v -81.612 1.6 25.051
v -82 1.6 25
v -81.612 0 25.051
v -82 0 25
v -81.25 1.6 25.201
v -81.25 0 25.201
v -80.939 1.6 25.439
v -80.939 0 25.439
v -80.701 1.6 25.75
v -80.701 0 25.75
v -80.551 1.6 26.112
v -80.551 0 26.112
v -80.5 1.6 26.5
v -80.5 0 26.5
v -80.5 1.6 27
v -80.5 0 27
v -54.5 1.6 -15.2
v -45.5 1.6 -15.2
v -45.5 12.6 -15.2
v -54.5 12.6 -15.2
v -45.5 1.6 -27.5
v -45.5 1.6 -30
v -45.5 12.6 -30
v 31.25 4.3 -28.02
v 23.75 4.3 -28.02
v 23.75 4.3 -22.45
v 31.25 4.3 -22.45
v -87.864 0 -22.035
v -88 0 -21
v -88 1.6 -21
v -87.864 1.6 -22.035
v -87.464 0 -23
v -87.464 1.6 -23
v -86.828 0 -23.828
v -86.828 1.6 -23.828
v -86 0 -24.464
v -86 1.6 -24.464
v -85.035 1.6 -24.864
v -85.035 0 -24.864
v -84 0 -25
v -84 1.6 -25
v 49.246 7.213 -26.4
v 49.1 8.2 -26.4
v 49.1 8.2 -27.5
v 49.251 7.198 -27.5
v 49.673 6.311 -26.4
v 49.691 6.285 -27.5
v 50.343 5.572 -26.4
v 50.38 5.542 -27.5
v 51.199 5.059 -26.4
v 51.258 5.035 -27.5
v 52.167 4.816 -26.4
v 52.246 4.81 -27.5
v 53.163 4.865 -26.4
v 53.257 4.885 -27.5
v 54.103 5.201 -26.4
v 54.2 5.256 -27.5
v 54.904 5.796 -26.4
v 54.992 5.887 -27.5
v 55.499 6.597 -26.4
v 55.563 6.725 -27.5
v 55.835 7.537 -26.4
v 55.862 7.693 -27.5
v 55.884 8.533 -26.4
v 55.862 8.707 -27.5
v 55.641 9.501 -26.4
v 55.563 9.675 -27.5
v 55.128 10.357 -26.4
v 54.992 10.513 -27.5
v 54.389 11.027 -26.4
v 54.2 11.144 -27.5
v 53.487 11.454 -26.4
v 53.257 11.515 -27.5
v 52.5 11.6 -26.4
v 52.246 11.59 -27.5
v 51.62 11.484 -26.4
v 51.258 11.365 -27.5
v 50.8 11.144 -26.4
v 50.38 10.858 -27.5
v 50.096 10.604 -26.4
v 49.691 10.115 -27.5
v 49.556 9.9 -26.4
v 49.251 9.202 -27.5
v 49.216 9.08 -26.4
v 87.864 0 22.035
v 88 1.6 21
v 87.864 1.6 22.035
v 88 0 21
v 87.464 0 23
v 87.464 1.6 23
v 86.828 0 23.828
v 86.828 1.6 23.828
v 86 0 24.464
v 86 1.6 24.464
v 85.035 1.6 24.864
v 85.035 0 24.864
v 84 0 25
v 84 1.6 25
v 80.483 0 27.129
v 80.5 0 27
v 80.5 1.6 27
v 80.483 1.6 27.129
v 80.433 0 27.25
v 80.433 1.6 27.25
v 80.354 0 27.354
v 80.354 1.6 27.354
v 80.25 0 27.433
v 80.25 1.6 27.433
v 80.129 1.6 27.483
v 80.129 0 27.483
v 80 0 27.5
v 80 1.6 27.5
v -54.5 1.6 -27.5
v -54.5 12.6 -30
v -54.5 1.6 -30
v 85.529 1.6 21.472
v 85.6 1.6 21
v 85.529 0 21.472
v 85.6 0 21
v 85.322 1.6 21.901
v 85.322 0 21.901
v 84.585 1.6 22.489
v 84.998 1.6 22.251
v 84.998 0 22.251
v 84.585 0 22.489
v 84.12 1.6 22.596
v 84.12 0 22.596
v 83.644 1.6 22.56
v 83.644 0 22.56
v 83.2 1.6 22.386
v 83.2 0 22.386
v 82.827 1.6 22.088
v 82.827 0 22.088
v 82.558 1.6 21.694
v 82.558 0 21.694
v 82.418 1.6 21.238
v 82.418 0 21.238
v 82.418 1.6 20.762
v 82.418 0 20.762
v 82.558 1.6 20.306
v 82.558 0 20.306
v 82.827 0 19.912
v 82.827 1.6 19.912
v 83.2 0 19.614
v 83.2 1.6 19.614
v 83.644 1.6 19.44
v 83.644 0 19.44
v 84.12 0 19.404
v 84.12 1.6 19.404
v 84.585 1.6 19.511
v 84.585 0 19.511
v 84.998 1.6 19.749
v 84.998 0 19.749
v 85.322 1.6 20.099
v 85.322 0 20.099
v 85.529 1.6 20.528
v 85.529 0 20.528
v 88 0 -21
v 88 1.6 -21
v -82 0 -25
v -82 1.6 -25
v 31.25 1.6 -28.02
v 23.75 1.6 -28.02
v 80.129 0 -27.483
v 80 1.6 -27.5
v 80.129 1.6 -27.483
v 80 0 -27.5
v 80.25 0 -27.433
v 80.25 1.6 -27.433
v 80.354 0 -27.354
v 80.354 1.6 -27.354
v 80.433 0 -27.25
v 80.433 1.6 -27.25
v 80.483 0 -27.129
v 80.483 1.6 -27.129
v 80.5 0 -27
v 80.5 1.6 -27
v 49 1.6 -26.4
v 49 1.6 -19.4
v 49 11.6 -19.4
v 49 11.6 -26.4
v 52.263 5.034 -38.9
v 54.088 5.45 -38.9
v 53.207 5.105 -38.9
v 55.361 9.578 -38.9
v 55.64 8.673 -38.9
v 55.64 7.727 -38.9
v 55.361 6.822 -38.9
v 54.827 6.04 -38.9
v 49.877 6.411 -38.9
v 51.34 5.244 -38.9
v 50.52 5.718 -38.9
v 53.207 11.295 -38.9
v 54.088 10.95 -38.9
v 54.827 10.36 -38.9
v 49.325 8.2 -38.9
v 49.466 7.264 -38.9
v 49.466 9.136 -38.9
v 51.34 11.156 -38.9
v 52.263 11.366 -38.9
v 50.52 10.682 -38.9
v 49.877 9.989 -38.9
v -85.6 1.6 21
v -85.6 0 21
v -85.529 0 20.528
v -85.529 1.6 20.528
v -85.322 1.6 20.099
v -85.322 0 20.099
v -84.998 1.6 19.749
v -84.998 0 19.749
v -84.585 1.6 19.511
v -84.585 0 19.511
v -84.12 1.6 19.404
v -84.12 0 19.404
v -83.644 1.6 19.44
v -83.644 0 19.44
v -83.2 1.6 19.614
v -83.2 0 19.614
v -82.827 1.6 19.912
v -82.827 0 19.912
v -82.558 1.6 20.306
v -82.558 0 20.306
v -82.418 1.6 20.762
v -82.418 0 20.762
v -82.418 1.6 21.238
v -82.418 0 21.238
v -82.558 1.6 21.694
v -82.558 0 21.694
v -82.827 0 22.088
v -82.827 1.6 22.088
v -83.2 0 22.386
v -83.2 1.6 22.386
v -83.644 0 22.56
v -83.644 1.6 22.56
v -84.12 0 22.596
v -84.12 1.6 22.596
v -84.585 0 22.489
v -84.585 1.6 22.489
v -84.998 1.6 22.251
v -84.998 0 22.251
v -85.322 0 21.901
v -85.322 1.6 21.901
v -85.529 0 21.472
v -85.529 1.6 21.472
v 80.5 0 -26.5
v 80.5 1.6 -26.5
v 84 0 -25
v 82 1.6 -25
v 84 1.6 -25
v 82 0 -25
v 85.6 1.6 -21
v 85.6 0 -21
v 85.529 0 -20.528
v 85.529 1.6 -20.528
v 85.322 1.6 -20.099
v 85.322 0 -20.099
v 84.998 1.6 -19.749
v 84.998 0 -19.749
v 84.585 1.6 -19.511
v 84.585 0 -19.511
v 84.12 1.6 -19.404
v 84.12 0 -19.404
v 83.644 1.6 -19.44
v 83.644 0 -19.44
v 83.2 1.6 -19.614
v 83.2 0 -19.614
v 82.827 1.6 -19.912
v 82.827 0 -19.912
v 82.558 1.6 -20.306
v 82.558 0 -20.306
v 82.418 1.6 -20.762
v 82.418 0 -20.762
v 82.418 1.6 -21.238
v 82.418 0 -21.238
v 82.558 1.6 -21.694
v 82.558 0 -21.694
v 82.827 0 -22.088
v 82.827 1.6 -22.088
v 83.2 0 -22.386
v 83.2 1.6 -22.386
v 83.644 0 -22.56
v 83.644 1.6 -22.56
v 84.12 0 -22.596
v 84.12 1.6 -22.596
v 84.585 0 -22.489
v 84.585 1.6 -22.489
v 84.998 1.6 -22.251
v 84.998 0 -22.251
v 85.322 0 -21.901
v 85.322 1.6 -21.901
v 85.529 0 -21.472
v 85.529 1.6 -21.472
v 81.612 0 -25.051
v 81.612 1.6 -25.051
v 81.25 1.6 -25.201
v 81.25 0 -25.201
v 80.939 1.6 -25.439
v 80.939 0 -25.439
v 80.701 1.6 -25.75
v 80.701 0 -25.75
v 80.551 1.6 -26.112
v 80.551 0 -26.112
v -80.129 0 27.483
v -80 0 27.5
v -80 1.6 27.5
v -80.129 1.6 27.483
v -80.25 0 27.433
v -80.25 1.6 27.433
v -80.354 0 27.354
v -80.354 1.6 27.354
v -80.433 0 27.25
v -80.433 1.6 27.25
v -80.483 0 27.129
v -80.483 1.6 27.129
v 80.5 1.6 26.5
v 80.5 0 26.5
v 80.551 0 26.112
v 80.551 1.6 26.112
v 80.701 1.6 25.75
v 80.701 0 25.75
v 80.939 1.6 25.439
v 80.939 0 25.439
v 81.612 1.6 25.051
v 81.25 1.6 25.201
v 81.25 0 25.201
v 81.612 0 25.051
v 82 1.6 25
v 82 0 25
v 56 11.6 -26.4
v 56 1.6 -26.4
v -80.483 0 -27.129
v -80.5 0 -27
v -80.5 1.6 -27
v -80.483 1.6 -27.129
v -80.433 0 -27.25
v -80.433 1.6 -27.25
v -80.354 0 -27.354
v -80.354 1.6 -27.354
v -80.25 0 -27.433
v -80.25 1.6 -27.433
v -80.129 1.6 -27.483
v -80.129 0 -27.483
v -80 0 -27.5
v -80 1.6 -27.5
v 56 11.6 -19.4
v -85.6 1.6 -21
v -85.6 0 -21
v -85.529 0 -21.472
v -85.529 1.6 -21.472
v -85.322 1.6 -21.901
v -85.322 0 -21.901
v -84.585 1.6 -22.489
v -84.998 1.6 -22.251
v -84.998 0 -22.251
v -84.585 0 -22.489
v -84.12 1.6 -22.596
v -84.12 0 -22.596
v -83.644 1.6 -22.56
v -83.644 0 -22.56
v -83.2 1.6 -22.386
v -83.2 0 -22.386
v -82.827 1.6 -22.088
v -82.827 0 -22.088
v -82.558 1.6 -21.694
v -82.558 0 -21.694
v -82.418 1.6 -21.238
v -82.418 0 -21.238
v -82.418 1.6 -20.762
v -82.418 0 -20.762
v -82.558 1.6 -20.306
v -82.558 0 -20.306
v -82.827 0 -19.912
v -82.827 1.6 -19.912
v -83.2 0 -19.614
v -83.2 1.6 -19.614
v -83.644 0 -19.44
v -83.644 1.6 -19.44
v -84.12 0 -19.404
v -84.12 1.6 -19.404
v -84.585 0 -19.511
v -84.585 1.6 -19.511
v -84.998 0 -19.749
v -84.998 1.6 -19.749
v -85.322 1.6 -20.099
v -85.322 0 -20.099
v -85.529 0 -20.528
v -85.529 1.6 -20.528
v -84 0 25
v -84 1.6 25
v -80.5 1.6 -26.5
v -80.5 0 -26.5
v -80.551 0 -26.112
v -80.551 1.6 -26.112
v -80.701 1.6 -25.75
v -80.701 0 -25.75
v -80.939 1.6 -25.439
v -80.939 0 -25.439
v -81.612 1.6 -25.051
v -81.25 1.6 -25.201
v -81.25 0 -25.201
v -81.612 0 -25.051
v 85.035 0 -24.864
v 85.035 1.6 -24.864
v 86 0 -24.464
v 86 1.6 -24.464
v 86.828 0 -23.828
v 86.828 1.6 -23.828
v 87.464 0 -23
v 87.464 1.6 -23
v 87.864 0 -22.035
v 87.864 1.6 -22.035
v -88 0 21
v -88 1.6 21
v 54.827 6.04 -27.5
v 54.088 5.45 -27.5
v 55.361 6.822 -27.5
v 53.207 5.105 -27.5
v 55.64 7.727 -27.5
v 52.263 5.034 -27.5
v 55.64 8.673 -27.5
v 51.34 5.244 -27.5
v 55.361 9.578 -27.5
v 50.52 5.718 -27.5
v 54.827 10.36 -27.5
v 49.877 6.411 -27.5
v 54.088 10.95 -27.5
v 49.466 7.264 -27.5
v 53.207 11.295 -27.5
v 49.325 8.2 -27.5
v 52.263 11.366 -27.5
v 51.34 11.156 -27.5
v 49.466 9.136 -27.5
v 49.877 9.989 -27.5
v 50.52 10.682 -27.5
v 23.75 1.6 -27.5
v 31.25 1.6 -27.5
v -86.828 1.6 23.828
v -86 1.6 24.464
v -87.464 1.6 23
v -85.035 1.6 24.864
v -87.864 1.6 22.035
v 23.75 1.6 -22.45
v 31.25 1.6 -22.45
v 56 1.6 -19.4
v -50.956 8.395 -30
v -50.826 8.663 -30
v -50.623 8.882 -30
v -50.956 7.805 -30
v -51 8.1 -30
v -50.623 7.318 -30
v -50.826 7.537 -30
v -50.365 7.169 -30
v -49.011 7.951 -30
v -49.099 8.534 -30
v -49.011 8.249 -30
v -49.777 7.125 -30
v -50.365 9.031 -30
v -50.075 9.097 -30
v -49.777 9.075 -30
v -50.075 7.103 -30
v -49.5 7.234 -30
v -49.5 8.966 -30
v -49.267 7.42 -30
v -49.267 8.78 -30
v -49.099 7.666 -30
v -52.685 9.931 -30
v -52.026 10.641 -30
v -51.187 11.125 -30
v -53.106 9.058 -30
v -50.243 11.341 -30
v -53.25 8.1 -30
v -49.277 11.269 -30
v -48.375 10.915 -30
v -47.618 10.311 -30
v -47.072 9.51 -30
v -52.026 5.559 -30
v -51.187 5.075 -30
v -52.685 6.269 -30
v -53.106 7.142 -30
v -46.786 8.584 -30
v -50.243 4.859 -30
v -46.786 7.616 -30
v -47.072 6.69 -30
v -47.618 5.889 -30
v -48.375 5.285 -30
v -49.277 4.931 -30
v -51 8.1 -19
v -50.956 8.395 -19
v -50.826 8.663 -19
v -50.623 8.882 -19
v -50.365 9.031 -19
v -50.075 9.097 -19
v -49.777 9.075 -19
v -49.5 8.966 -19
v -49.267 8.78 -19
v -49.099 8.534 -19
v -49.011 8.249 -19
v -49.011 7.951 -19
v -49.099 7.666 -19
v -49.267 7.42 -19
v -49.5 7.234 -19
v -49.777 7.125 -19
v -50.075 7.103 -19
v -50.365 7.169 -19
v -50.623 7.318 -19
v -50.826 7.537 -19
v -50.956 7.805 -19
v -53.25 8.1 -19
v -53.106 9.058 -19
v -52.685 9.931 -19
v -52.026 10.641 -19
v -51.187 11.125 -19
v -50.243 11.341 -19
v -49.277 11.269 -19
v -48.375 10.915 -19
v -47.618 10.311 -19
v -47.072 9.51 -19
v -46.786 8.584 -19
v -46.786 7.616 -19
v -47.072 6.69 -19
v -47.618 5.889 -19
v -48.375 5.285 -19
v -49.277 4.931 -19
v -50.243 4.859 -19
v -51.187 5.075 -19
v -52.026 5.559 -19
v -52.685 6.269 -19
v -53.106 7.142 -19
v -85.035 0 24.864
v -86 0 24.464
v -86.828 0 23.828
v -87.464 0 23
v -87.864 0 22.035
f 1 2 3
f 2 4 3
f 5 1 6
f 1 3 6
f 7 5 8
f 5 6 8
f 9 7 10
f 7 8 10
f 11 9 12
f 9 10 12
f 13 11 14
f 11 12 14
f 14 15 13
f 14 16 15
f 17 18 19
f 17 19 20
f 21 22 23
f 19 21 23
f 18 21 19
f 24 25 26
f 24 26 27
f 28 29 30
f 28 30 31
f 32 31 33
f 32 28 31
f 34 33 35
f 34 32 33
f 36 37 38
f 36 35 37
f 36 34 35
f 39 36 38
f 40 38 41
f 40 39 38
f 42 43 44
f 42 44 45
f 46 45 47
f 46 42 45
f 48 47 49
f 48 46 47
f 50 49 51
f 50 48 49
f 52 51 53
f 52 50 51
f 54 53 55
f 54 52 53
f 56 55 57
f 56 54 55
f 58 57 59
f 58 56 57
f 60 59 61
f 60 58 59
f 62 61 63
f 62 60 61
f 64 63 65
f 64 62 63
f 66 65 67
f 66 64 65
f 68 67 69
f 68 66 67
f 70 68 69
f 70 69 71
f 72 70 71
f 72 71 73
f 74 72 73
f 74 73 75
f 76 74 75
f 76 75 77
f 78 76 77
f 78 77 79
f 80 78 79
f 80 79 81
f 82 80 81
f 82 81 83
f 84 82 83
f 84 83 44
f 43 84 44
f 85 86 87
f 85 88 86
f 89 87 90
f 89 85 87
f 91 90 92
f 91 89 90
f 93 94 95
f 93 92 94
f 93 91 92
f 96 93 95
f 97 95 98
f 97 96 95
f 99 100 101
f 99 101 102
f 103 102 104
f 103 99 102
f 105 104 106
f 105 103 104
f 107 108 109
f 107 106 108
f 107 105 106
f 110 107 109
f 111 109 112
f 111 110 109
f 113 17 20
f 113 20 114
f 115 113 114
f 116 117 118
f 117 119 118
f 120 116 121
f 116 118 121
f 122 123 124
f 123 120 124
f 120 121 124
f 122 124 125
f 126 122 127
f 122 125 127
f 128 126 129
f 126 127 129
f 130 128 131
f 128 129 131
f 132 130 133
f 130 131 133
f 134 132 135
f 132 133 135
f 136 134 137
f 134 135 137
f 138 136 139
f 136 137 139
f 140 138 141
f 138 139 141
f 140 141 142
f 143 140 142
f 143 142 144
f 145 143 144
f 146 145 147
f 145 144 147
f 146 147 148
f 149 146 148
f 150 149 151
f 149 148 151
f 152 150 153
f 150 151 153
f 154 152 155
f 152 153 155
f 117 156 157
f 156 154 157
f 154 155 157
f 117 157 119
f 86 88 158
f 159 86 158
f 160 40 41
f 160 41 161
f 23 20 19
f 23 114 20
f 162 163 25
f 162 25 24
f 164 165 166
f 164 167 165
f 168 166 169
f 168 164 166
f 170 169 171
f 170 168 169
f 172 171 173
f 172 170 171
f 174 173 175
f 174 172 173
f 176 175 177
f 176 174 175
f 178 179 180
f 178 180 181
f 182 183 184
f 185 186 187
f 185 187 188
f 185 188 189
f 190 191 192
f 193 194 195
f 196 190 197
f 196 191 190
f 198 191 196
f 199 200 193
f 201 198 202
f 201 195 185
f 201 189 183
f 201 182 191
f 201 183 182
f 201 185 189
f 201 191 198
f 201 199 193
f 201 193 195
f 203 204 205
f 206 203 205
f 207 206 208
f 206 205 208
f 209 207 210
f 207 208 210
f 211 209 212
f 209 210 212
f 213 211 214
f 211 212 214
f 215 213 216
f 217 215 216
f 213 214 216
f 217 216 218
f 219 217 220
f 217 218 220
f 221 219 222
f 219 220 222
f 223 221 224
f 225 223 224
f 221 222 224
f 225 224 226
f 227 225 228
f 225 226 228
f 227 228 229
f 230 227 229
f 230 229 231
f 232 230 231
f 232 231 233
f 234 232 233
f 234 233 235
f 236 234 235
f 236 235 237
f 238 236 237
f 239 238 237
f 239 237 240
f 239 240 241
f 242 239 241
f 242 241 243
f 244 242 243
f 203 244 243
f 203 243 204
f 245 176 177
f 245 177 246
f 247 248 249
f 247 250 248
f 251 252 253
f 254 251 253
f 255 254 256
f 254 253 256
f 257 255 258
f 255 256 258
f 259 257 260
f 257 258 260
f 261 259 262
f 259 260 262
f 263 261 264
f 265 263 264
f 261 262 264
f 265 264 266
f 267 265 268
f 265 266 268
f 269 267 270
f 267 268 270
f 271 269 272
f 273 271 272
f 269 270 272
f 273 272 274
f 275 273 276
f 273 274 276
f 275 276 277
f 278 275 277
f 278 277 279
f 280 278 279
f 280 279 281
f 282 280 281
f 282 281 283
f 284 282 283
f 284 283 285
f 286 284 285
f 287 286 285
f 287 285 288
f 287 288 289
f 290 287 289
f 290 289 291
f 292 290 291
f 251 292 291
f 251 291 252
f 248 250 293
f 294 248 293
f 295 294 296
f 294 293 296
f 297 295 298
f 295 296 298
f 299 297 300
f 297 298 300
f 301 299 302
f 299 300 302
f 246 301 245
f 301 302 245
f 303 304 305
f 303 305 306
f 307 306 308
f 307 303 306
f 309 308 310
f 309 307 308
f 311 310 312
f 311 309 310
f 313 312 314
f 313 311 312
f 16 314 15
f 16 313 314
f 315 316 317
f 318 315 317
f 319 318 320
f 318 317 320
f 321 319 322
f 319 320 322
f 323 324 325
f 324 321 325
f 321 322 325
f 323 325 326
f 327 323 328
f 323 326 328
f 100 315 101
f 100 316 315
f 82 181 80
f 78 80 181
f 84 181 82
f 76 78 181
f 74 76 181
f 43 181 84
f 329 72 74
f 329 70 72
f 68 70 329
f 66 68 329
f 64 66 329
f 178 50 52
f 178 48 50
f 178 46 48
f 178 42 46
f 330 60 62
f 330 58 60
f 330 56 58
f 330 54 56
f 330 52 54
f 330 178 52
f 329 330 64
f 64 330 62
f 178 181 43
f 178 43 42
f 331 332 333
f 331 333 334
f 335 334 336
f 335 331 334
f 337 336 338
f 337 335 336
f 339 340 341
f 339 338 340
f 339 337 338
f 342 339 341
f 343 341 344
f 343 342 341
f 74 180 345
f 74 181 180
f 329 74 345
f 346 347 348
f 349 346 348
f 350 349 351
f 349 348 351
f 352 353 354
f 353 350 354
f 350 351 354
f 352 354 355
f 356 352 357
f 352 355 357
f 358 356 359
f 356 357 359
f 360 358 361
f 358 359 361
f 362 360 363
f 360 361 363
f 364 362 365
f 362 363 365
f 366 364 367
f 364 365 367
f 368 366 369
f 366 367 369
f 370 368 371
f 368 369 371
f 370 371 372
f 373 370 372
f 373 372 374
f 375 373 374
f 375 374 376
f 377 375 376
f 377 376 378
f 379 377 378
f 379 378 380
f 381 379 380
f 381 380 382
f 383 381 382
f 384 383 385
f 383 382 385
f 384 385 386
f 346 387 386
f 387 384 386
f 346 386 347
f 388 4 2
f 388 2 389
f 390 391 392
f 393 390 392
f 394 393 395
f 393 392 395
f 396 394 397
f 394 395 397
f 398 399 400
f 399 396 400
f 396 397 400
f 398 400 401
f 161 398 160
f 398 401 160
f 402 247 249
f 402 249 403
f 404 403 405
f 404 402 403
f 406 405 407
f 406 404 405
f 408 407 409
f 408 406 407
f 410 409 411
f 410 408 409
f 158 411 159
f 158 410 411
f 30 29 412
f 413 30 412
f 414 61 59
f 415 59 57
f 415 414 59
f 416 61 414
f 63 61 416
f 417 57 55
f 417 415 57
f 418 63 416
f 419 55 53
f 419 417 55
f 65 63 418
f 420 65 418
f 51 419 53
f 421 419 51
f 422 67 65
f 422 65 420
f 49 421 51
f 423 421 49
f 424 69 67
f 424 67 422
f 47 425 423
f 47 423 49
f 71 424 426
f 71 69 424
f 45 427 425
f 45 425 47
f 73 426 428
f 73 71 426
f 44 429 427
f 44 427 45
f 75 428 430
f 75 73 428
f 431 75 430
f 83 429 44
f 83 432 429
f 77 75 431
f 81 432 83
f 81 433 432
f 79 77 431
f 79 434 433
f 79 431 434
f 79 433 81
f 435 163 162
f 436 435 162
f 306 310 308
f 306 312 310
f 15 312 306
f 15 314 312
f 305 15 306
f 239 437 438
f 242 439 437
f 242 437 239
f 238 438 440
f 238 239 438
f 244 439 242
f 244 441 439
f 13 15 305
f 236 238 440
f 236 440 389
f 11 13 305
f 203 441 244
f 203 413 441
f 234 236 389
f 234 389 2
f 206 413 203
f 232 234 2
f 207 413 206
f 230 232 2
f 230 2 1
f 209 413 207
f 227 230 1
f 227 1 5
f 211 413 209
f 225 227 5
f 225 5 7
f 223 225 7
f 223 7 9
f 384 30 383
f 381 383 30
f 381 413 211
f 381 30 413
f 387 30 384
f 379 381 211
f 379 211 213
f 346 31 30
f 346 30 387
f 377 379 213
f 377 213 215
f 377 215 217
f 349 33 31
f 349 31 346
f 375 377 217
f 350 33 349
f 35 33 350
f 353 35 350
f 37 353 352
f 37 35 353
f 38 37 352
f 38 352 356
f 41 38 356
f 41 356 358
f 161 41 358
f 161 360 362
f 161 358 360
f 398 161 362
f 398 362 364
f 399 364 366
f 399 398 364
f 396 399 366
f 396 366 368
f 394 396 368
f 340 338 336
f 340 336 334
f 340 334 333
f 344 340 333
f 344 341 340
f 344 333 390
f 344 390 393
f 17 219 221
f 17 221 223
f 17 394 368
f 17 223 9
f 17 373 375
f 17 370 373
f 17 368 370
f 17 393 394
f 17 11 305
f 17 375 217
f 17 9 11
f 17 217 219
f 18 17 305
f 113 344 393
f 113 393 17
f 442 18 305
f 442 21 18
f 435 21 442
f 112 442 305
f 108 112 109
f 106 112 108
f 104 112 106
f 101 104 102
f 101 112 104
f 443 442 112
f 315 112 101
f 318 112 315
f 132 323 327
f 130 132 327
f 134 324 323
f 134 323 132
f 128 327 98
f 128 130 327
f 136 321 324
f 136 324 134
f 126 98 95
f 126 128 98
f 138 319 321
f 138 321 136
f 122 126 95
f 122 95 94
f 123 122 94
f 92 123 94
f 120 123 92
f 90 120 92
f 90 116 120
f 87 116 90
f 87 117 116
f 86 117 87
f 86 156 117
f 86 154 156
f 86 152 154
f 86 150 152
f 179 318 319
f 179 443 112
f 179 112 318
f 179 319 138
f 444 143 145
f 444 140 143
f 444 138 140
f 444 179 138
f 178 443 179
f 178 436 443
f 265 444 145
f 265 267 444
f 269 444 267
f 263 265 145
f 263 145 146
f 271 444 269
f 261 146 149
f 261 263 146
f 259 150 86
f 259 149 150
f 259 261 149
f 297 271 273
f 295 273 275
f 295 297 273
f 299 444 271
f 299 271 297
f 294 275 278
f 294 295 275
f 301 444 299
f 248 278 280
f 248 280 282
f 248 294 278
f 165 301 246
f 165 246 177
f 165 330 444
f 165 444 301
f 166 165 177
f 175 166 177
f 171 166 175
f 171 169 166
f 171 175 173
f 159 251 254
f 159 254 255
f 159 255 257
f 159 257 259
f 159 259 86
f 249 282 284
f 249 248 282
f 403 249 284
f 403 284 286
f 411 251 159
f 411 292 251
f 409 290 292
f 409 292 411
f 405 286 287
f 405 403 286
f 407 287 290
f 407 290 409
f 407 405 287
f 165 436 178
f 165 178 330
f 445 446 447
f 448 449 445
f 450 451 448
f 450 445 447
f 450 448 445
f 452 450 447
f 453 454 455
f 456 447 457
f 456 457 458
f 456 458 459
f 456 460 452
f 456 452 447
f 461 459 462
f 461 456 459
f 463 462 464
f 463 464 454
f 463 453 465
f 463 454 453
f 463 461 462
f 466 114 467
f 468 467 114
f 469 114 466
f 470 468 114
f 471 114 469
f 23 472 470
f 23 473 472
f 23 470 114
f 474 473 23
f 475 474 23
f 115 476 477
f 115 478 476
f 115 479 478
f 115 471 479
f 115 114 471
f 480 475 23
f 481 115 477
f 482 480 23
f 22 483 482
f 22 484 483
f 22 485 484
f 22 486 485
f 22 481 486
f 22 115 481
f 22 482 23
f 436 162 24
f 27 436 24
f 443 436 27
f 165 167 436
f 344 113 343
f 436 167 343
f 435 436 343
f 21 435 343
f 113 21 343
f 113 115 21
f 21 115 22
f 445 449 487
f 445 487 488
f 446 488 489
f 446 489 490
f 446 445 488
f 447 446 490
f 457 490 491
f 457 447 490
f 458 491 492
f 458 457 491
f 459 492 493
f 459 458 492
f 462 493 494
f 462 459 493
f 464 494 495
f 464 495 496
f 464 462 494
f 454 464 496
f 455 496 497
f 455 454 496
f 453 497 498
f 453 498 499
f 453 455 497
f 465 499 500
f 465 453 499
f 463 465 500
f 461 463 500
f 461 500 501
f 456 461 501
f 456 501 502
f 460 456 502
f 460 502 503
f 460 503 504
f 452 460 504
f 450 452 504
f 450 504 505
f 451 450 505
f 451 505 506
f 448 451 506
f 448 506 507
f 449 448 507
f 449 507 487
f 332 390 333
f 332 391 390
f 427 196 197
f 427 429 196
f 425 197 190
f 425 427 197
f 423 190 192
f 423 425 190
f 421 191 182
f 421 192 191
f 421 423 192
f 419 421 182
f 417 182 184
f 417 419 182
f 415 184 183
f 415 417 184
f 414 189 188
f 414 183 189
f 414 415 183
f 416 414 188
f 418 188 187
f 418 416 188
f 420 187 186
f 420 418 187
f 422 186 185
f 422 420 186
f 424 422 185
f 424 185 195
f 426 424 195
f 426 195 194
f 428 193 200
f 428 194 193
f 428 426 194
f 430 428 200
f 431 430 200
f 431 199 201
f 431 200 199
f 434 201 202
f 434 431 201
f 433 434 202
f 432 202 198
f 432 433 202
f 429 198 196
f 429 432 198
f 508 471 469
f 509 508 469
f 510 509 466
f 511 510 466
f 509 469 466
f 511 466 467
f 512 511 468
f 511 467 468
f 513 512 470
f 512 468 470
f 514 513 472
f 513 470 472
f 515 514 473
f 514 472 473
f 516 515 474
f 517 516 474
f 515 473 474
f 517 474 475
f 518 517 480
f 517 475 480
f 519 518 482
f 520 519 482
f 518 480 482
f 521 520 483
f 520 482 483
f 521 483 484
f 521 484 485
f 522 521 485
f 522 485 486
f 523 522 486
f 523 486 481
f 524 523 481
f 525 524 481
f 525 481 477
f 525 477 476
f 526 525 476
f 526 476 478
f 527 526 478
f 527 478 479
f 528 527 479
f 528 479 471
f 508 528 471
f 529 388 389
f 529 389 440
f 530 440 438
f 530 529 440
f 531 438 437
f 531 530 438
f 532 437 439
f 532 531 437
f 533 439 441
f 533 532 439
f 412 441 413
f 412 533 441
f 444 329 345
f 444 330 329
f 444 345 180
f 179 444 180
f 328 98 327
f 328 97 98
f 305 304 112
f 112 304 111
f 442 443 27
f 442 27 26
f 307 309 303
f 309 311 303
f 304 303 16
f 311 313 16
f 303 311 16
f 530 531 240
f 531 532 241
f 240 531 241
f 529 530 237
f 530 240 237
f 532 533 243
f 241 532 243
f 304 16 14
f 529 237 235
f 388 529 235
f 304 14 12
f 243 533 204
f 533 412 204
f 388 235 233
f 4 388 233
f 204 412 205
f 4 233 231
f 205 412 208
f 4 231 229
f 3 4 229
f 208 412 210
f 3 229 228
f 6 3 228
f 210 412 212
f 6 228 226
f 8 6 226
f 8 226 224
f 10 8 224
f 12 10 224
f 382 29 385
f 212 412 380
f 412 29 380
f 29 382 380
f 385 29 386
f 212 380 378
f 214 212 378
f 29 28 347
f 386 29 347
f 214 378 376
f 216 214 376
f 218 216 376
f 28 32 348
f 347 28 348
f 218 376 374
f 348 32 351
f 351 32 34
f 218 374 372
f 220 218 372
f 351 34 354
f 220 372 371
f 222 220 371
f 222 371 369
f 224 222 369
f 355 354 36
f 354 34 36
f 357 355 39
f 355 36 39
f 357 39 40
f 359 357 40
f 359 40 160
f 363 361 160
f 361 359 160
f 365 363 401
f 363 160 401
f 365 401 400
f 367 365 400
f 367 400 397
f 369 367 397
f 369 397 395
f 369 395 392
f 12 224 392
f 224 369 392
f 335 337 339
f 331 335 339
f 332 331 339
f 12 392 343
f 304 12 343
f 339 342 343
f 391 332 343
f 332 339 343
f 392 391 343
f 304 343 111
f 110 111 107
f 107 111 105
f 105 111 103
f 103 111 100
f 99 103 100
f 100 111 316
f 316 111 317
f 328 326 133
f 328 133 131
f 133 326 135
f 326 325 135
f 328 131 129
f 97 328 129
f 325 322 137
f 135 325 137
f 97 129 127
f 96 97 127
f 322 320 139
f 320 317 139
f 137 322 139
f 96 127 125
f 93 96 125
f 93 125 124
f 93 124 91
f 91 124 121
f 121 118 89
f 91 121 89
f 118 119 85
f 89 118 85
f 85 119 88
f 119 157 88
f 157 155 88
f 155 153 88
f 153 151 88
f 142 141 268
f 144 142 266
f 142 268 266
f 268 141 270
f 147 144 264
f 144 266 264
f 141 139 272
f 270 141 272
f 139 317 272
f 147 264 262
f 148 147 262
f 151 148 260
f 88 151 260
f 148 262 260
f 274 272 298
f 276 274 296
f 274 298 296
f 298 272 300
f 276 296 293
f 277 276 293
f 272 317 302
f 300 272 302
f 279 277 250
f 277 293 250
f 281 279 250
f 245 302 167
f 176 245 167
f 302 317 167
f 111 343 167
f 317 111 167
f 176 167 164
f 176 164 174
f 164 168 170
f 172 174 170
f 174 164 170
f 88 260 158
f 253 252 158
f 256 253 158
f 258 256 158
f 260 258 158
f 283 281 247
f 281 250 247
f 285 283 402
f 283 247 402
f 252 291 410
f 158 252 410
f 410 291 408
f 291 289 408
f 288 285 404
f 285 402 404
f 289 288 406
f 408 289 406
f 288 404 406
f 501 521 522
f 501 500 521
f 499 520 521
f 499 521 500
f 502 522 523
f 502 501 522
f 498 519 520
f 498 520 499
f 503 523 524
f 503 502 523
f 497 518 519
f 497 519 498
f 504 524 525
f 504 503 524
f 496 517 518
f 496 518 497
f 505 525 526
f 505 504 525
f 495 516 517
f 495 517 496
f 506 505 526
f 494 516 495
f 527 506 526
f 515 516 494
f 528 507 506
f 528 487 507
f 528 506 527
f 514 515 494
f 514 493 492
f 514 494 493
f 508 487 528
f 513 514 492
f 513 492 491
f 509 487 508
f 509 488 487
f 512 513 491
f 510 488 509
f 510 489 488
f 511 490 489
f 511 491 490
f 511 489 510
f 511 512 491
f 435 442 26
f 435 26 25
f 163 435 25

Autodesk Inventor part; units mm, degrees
ref_plane "YZ Plane" through (0, 0, 0) normal (1, 0, 0) x (0, 1, 0)
ref_plane "XZ Plane" through (0, 0, 0) normal (0, 1, 0) x (-1, 0, 0)
ref_plane "XY Plane" through (0, 0, 0) normal (0, 0, 1) x (1, 0, 0)
sketch "Sketch2" plane through (0, 0, 0) normal (0, 1, 0) x (-1, 0, 0)
  line L0 (101.6465, 0) -> (-102.4493, 0)
  line L1 (0, -49.7697) -> (0, 40.9396)
  line L2 (0, -27.5) -> (80, -27.5)
  line L3 (88, -27.5) -> (88, -25) construction
  line L4 (84, -25) -> (82, -25)
  line L5 (80.5, -26.5) -> (80.5, -27)
  line L6 (88, -21) -> (88, 0)
  line L7 (80.5, -27.5) -> (88, -27.5) construction
  arc A0 (84, -25) -> (88, -21) centre (84, -21) ccw
  arc A1 (82, -25) -> (80.5, -26.5) centre (82, -26.5) ccw
  arc A2 (80, -27.5) -> (80.5, -27) centre (80, -27) ccw
  circle A3 centre (84, -21) radius 1.6
  point P0 (0, 0)
  dimension "d7" = 176
  dimension "d8" = 55
  dimension "d9" = 2.5
  dimension "d10" = 7.5
  dimension "d11" = 4
  dimension "d12" = 1.5
  dimension "d13" = 0.5
  dimension "d16" = 3.2
extrude "Extrusion1" add sketch "Sketch2" along normal blind 1.6
mirror "Mirror1" about plane through (0, 0, 0) normal (0, 0, 1) of "Extrusion1"
mirror "Mirror2" about plane through (0, 0, 0) normal (1, 0, 0) of "Extrusion1", "Mirror1"
sketch "Sketch3" plane through (0, 1.6, 0) normal (0, 1, 0) x (1, 0, 0)
  line L0 (-54.5, 30) -> (-45.5, 30)
  line L1 (-45.5, 30) -> (-45.5, 15.2)
  line L2 (-45.5, 15.2) -> (-54.5, 15.2)
  line L3 (-54.5, 15.2) -> (-54.5, 30)
  point P0 (0, 0)
  point P1 (-50, 25)
  point P2 (-50, 30)
  dimension "d17" = 50
  dimension "d18" = 25
  dimension "d19" = 9
  dimension "d20" = 14.8
  dimension "d21" = 5
extrude "Extrusion2" add sketch "Sketch3" along normal blind 11
sketch "Sketch4" plane through (-45.5, 1.6, -30) normal (0, 0, -1) x (-1, 0, 0)
  circle A0 centre (4.5, 6.5) radius 3.25
  line L0 (0, 11) -> (9, 11) projected
  line L1 (9, 0) -> (0, 0) projected
  circle A1 centre (4.5, 6.5) radius 1
  point P0 (-45.5, -1.6)
  point P1 (4.5, 11)
  point P2 (4.5, 11)
  dimension "d24" = 6.5
  dimension "d25" = 6.5
  dimension "d26" = 2
extrude "Extrusion3" cut sketch "Sketch4" against normal blind 11
sketch "Sketch5" plane through (0, 1.6, 0) normal (0, 1, 0) x (1, 0, 0)
  line L0 (56, 19.4) -> (49, 19.4)
  line L1 (49, 19.4) -> (49, 26.4)
  line L2 (49, 26.4) -> (56, 26.4)
  line L3 (56, 26.4) -> (56, 19.4)
  line L4 (56, 19.4) -> (49, 26.4) construction
  line L5 (49, 19.4) -> (56, 26.4) construction
  point P0 (0, 0)
  point P1 (52.5, 22.9)
  dimension "d29" = 52.5
  dimension "d30" = 22.9
  dimension "d31" = 7
extrude "Extrusion4" add sketch "Sketch5" along normal blind 10
sketch "Sketch6" plane through (56, 1.6, -26.4) normal (0, 0, -1) x (-1, 0, 0)
  line L0 (0, 10) -> (7, 10) projected
  circle A0 centre (3.5, 6.6) radius 3.4
  line L1 (101.5, 0) -> (-24, 0) projected
  point P0 (56, -1.6)
  point P1 (3.5, 10)
  dimension "d34" = 6.6
  dimension "d35" = 6.8
extrude "Extrusion5" add sketch "Sketch6" along normal blind 1.1
sketch "Sketch7" plane through (52.5, 8.2, -27.5) normal (0, 0, -1) x (-1, 0, 0)
  circle A0 centre (0, 0) radius 3.4 projected
  circle A1 centre (0, 0) radius 3.175
  point P0 (52.5, -8.2)
  dimension "d38" = 6.35
extrude "Extrusion6" add sketch "Sketch7" along normal blind 11.4 contours A1
sketch "Sketch8" plane through (0, 1.6, 0) normal (0, 1, 0) x (1, 0, 0)
  line L0 (23.75, 28.02) -> (31.25, 28.02)
  line L1 (31.25, 28.02) -> (31.25, 22.45)
  line L2 (31.25, 22.45) -> (23.75, 22.45)
  line L3 (23.75, 22.45) -> (23.75, 28.02)
  point P0 (0, 0)
  point P1 (27.5, 27.5)
  point P2 (27.5, 28.02)
  dimension "d41" = 27.5
  dimension "d42" = 27.5
  dimension "d43" = 5.05
  dimension "d44" = 0.52
  dimension "d45" = 7.5
extrude "Extrusion7" add sketch "Sketch8" along normal blind 2.7
equation "\"BendRadius\" = Thickness"
equation "\"BendReliefWidth\" = Thickness"
equation "\"BendReliefDepth\" = 0.5 * Thickness"
equation "\"CornerReliefSize\" = 4 * Thickness"
equation "\"MinimumRemnant\" = 2 * Thickness"
equation "\"TransitionRadius\" = BendRadius"
equation "\"JacobiRadiusSize\" = BendRadius"
equation "\"GapSize\" = Thickness"
equation "\"Thickness\" = 0.5"
properties part number "MainPCB"
